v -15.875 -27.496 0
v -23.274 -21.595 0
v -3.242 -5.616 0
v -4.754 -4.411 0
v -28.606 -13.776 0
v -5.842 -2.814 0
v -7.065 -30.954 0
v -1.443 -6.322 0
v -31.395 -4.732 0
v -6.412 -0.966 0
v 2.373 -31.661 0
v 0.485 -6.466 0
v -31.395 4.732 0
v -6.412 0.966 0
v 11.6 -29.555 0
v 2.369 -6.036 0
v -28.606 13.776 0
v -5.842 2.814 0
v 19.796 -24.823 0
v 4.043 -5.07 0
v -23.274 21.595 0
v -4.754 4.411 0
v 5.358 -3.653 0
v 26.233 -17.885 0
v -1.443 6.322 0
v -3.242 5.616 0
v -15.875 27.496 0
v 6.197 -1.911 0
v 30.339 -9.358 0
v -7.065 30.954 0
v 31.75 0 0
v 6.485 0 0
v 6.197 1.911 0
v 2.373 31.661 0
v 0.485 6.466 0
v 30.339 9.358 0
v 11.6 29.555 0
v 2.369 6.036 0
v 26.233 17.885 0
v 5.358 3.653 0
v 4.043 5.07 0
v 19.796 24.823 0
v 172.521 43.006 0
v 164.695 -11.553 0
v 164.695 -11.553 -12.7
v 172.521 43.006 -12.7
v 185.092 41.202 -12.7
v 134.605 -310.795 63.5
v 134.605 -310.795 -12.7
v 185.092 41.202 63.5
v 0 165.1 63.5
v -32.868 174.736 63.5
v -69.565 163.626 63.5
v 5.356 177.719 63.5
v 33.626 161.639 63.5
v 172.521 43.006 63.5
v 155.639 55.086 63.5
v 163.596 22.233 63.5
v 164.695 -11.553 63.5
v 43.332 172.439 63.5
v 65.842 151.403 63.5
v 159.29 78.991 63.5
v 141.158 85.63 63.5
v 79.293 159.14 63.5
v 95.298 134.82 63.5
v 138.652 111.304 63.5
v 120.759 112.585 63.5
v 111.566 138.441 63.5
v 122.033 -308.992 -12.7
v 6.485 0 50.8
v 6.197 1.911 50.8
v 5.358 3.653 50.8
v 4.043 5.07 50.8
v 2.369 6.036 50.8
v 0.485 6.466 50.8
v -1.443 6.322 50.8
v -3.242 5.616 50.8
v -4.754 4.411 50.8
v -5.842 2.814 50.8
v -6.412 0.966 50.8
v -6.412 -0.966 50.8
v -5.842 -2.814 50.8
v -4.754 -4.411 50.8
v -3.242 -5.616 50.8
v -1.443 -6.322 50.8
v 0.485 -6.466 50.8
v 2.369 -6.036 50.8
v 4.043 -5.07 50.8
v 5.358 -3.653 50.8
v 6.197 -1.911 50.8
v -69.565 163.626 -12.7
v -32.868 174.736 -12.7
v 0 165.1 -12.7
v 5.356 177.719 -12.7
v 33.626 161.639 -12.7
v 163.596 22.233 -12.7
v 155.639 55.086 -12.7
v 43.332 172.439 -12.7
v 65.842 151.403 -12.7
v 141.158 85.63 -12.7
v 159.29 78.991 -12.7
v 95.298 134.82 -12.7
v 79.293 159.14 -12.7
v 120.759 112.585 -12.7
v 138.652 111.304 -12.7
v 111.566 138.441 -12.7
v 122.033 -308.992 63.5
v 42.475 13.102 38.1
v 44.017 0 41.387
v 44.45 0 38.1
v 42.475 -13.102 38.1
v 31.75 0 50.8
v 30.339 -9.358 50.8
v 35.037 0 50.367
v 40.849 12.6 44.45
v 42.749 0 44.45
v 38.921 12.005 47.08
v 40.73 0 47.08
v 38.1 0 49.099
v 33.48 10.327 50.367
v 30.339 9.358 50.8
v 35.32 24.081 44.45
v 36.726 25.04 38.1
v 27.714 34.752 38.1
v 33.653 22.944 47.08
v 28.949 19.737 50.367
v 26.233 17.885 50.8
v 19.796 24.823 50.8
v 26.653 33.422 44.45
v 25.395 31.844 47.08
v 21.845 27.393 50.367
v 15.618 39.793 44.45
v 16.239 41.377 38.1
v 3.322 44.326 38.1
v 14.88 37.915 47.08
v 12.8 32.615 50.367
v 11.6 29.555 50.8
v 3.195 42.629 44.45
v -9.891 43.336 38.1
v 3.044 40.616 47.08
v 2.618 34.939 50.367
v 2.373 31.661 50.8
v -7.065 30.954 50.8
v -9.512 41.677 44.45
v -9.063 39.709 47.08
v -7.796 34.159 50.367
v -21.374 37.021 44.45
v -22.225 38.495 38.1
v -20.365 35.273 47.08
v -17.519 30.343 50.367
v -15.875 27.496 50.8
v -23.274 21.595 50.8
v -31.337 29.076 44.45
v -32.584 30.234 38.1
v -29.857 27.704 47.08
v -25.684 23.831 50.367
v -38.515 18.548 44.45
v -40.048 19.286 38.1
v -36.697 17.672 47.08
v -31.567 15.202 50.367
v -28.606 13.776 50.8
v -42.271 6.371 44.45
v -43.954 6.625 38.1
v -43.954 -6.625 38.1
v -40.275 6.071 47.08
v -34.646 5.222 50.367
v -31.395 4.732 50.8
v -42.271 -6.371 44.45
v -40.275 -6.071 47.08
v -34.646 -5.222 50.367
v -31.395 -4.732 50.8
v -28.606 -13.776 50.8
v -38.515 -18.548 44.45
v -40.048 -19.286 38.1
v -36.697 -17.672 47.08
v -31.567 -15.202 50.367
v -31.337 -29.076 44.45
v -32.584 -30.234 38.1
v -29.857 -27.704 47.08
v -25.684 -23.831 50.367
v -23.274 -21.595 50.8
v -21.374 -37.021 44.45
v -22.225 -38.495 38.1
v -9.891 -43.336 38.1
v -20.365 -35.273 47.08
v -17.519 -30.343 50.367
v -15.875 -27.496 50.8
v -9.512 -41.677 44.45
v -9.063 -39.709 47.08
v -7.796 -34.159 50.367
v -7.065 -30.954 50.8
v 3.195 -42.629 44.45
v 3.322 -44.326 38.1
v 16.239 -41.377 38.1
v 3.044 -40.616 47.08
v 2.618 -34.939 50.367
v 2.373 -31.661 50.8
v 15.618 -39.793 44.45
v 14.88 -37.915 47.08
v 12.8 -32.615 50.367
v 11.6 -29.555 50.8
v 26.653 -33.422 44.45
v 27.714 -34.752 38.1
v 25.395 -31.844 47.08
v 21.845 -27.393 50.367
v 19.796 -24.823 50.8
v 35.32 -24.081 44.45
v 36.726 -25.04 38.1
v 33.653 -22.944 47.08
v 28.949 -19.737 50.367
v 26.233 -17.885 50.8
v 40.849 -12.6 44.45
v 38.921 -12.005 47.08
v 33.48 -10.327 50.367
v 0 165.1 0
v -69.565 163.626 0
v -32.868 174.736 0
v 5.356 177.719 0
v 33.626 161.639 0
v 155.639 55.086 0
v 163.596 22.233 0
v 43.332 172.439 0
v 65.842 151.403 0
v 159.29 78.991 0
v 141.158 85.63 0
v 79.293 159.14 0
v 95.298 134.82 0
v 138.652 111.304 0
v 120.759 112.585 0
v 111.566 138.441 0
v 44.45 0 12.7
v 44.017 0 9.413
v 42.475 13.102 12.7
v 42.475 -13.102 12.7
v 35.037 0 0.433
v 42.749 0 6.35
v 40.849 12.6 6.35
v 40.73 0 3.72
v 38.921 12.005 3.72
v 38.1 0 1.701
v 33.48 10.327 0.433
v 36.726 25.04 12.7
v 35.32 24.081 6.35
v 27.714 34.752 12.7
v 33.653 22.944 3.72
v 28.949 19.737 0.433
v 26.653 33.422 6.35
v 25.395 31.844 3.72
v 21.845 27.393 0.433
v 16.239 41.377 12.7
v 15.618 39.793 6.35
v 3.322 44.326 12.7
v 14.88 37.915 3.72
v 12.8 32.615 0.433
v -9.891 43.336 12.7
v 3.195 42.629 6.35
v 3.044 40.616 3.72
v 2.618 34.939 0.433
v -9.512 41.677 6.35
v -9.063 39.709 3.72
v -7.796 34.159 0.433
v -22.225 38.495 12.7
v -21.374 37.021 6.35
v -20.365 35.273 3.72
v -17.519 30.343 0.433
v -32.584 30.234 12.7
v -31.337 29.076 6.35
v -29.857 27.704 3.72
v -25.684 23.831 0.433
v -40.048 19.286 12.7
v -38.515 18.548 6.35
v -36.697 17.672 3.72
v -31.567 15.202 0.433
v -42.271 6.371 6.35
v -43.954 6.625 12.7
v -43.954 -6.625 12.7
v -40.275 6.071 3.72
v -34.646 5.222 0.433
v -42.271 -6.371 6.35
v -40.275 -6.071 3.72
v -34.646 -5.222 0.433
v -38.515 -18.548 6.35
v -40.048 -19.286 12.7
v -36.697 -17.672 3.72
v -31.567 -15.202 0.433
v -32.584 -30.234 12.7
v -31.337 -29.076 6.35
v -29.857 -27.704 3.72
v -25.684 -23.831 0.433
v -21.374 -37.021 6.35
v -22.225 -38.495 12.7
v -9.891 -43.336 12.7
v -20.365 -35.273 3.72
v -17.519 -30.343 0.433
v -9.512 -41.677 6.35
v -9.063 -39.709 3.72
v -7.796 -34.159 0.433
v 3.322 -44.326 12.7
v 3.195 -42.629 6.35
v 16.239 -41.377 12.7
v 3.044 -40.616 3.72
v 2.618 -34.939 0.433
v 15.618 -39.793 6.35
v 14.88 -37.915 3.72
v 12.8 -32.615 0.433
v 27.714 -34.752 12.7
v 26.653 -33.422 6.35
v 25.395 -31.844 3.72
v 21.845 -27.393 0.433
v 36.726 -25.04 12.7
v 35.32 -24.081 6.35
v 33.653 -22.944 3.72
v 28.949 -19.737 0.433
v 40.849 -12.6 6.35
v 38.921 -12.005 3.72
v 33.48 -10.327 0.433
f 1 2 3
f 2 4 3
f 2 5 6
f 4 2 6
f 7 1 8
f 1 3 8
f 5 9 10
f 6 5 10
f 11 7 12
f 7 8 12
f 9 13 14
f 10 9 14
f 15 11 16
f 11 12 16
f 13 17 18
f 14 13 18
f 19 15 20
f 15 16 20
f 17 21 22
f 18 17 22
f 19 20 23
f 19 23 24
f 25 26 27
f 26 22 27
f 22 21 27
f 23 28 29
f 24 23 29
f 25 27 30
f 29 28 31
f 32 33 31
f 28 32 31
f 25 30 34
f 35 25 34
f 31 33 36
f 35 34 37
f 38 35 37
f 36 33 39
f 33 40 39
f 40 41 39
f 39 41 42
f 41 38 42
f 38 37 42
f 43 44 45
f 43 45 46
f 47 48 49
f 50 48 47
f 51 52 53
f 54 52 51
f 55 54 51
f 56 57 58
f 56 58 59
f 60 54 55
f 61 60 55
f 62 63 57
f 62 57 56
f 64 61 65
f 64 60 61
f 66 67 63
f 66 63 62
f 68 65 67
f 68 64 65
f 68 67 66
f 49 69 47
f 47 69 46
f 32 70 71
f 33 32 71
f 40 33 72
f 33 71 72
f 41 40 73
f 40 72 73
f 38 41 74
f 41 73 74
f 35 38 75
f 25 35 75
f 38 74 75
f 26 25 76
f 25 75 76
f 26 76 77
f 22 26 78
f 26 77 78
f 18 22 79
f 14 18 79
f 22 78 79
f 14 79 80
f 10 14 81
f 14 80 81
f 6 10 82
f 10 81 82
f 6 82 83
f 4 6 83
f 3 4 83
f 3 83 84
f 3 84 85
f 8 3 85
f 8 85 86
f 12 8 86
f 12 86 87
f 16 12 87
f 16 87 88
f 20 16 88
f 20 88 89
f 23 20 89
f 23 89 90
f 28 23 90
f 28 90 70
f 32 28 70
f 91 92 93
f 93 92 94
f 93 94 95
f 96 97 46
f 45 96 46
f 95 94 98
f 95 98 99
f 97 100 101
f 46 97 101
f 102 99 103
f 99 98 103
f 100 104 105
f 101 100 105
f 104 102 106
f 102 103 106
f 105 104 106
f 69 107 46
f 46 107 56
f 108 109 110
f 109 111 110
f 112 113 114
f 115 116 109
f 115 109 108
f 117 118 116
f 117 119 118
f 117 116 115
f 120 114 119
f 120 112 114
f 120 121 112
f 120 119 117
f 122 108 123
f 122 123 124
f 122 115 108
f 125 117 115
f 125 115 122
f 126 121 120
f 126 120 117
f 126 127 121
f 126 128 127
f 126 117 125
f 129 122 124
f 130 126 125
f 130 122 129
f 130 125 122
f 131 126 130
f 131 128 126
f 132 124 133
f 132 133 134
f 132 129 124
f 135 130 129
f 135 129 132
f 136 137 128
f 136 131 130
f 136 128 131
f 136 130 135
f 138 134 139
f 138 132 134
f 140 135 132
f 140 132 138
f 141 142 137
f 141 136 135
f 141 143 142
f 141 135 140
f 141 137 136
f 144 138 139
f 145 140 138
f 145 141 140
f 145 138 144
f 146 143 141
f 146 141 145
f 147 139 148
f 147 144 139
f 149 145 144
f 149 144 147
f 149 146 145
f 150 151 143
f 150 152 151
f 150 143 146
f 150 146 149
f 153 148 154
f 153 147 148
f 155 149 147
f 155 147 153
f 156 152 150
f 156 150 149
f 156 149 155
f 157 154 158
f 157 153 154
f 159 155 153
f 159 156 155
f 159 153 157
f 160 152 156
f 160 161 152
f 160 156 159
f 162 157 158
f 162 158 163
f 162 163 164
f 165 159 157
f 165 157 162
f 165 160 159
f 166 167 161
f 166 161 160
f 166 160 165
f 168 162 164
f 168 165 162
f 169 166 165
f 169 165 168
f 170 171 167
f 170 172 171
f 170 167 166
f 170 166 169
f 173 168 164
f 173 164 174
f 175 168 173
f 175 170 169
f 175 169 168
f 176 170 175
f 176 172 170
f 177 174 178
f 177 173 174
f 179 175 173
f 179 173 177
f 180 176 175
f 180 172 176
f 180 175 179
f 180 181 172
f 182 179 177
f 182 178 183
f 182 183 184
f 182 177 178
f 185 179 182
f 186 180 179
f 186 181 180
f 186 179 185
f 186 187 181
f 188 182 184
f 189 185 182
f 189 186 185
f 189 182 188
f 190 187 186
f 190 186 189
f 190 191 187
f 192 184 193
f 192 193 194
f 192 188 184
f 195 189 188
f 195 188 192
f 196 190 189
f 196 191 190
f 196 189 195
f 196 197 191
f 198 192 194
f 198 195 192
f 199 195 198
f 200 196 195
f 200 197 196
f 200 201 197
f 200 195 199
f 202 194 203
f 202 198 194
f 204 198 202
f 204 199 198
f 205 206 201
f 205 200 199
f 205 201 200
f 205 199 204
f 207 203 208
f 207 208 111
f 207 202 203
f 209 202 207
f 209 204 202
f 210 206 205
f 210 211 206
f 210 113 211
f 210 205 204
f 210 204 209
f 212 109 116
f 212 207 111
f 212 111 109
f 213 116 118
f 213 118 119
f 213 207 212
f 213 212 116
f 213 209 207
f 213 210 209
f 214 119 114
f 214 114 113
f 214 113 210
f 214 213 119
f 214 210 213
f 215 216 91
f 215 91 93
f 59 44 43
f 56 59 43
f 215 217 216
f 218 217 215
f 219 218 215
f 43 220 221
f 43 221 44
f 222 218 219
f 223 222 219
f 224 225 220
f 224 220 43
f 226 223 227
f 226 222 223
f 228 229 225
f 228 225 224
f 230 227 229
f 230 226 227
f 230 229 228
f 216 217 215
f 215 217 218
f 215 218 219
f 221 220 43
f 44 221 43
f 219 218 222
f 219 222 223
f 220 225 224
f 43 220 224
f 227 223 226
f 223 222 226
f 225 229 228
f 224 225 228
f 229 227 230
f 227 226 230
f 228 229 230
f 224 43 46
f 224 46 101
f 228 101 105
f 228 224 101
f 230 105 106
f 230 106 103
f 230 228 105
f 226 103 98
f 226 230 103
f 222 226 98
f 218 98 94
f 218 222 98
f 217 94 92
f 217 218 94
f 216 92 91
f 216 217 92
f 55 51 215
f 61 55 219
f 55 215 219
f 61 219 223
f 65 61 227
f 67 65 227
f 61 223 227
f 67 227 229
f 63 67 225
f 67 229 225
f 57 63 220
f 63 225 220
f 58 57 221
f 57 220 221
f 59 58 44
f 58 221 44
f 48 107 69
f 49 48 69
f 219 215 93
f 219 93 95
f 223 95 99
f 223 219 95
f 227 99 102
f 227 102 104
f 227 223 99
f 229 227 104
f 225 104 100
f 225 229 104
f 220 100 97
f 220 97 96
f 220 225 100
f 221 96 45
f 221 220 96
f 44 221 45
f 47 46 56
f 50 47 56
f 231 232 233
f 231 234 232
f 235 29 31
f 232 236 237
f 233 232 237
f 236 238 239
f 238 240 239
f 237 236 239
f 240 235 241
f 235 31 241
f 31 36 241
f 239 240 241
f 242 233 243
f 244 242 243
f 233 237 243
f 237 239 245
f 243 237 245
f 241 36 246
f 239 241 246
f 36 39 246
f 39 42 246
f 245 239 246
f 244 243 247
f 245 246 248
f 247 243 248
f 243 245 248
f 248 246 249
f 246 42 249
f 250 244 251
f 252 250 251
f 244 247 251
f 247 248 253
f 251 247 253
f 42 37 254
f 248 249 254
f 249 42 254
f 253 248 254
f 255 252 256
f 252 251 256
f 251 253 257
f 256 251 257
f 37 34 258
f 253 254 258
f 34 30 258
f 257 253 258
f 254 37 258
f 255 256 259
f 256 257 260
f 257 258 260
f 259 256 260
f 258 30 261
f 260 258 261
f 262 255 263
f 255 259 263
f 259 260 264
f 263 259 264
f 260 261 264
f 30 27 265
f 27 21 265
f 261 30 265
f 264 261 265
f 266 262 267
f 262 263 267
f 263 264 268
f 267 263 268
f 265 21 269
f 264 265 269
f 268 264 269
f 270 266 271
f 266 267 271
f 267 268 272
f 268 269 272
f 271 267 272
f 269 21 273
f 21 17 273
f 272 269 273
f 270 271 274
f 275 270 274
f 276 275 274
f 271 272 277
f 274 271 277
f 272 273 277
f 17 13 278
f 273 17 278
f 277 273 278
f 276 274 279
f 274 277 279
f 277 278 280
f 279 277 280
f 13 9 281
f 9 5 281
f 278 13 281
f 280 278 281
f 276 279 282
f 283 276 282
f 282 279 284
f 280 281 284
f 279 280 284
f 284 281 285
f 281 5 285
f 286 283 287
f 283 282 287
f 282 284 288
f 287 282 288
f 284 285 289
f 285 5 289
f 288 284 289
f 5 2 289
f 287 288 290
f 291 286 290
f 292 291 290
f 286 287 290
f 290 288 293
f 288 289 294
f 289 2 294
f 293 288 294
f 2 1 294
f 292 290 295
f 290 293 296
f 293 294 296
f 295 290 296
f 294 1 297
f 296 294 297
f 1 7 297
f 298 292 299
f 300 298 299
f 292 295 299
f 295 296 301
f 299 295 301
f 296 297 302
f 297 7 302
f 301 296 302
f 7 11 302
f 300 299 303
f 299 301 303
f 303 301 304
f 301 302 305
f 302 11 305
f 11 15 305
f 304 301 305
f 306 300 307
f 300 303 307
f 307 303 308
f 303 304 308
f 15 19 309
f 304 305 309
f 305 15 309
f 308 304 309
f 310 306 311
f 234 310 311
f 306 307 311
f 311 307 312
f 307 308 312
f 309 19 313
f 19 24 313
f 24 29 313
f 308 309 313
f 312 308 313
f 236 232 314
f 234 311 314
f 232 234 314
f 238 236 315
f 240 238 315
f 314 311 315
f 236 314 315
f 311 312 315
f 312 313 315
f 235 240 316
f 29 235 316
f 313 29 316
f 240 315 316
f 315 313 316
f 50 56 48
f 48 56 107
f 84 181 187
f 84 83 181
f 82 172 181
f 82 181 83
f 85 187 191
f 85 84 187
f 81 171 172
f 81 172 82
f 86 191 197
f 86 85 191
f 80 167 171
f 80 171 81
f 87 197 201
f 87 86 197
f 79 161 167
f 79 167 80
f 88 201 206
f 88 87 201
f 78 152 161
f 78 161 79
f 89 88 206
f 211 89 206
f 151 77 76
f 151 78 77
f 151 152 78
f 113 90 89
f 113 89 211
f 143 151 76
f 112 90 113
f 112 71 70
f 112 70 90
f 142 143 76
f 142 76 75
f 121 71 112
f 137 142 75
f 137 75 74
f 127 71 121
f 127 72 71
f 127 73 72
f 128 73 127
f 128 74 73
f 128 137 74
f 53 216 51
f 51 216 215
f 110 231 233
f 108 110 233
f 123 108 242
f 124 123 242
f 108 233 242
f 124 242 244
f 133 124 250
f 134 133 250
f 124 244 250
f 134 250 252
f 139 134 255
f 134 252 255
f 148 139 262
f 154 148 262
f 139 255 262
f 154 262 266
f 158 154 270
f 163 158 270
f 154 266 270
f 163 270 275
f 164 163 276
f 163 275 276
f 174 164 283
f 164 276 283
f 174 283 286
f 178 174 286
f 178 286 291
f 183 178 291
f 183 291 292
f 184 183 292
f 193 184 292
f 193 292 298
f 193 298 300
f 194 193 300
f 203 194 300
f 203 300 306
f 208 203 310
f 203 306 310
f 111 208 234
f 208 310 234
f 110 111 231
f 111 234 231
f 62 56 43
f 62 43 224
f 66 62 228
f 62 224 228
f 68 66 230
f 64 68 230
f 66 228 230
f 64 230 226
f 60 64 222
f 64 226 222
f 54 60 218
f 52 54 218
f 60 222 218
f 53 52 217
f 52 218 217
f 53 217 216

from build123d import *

# Parameters (mm, degrees)
F0_R     = 44.45
F1_DEPTH = 50.8
F2_R     = 12.7
F3_R     = 6.484616496
F4_DEPTH = 76.2
F6_DEPTH = 63.5
F7_DEPTH = 12.7
F8_W     = 55.1167010857
F8_H     = 63.5
F9_DEPTH = 12.7


with BuildPart() as f1:
    # F0 (on Top) → F1 (new body)
    with BuildSketch(Plane.XY):
        Circle(F0_R)
    extrude(amount=F1_DEPTH)

    # F2
    f2_edges = [f1.edges().sort_by_distance(p)[0] for p in [
        (44.45, 0, 25.4),
        (-44.45, 0, 0),
        (-44.45, 0, 50.8),
    ]]
    fillet(f2_edges, radius=F2_R)

    # F3 (on face) → F4 (cut)
    with BuildSketch(Plane.XY.offset(50.8)):
        Circle(F3_R)
    extrude(amount=-F4_DEPTH, mode=Mode.SUBTRACT)


with BuildPart() as f6:
    # F5 (on Top) → F6 (new body)
    with BuildSketch(Plane.XY):
        with BuildLine():
            ThreePointArc((0, 165.1), (120.7588226786, 112.5847091984), (164.6952990237, -11.5528559021))
            Line((164.6952990237, -11.5528559021), (172.5206258367, 43.0055073325))
            ThreePointArc((172.5206258367, 43.0055073325), (79.292752248, 159.1398738247), (-69.5645559347, 163.6264421101))
            Line((-69.5645559347, 163.6264421101), (0, 165.1))
        make_face()
    extrude(amount=F6_DEPTH)


with BuildPart() as f7:
    # F7 (new): a face of the model
    f7_faces = [f6.part.faces().sort_by_distance(p)[0] for p in [
        (-34.8473665993, 167.4359620785, 0),
    ]]
    extrude(f7_faces, amount=F7_DEPTH)


with BuildPart() as f9:
    # F8 (on face) → F9 (new body)
    with BuildSketch(Plane(origin=(162.9990680345, -23.3790183934, 0), x_dir=(0.1419774163, 0.9898698971, 0), z_dir=(0.9898698971, -0.1419774163, 0))):
        with Locations((39.505539285, 31.75)):
            Rectangle(F8_W, F8_H)
        Polygon((-288.5361101722, 63.5), (-288.5361101722, -12.7), (67.0638898278, -12.7), (67.0638898278, 0), (11.9471887422, 0), (11.9471887422, 63.5), align=None)
    extrude(amount=F9_DEPTH)


solid = Compound([f1.part, f6.part, f7.part, f9.part])
